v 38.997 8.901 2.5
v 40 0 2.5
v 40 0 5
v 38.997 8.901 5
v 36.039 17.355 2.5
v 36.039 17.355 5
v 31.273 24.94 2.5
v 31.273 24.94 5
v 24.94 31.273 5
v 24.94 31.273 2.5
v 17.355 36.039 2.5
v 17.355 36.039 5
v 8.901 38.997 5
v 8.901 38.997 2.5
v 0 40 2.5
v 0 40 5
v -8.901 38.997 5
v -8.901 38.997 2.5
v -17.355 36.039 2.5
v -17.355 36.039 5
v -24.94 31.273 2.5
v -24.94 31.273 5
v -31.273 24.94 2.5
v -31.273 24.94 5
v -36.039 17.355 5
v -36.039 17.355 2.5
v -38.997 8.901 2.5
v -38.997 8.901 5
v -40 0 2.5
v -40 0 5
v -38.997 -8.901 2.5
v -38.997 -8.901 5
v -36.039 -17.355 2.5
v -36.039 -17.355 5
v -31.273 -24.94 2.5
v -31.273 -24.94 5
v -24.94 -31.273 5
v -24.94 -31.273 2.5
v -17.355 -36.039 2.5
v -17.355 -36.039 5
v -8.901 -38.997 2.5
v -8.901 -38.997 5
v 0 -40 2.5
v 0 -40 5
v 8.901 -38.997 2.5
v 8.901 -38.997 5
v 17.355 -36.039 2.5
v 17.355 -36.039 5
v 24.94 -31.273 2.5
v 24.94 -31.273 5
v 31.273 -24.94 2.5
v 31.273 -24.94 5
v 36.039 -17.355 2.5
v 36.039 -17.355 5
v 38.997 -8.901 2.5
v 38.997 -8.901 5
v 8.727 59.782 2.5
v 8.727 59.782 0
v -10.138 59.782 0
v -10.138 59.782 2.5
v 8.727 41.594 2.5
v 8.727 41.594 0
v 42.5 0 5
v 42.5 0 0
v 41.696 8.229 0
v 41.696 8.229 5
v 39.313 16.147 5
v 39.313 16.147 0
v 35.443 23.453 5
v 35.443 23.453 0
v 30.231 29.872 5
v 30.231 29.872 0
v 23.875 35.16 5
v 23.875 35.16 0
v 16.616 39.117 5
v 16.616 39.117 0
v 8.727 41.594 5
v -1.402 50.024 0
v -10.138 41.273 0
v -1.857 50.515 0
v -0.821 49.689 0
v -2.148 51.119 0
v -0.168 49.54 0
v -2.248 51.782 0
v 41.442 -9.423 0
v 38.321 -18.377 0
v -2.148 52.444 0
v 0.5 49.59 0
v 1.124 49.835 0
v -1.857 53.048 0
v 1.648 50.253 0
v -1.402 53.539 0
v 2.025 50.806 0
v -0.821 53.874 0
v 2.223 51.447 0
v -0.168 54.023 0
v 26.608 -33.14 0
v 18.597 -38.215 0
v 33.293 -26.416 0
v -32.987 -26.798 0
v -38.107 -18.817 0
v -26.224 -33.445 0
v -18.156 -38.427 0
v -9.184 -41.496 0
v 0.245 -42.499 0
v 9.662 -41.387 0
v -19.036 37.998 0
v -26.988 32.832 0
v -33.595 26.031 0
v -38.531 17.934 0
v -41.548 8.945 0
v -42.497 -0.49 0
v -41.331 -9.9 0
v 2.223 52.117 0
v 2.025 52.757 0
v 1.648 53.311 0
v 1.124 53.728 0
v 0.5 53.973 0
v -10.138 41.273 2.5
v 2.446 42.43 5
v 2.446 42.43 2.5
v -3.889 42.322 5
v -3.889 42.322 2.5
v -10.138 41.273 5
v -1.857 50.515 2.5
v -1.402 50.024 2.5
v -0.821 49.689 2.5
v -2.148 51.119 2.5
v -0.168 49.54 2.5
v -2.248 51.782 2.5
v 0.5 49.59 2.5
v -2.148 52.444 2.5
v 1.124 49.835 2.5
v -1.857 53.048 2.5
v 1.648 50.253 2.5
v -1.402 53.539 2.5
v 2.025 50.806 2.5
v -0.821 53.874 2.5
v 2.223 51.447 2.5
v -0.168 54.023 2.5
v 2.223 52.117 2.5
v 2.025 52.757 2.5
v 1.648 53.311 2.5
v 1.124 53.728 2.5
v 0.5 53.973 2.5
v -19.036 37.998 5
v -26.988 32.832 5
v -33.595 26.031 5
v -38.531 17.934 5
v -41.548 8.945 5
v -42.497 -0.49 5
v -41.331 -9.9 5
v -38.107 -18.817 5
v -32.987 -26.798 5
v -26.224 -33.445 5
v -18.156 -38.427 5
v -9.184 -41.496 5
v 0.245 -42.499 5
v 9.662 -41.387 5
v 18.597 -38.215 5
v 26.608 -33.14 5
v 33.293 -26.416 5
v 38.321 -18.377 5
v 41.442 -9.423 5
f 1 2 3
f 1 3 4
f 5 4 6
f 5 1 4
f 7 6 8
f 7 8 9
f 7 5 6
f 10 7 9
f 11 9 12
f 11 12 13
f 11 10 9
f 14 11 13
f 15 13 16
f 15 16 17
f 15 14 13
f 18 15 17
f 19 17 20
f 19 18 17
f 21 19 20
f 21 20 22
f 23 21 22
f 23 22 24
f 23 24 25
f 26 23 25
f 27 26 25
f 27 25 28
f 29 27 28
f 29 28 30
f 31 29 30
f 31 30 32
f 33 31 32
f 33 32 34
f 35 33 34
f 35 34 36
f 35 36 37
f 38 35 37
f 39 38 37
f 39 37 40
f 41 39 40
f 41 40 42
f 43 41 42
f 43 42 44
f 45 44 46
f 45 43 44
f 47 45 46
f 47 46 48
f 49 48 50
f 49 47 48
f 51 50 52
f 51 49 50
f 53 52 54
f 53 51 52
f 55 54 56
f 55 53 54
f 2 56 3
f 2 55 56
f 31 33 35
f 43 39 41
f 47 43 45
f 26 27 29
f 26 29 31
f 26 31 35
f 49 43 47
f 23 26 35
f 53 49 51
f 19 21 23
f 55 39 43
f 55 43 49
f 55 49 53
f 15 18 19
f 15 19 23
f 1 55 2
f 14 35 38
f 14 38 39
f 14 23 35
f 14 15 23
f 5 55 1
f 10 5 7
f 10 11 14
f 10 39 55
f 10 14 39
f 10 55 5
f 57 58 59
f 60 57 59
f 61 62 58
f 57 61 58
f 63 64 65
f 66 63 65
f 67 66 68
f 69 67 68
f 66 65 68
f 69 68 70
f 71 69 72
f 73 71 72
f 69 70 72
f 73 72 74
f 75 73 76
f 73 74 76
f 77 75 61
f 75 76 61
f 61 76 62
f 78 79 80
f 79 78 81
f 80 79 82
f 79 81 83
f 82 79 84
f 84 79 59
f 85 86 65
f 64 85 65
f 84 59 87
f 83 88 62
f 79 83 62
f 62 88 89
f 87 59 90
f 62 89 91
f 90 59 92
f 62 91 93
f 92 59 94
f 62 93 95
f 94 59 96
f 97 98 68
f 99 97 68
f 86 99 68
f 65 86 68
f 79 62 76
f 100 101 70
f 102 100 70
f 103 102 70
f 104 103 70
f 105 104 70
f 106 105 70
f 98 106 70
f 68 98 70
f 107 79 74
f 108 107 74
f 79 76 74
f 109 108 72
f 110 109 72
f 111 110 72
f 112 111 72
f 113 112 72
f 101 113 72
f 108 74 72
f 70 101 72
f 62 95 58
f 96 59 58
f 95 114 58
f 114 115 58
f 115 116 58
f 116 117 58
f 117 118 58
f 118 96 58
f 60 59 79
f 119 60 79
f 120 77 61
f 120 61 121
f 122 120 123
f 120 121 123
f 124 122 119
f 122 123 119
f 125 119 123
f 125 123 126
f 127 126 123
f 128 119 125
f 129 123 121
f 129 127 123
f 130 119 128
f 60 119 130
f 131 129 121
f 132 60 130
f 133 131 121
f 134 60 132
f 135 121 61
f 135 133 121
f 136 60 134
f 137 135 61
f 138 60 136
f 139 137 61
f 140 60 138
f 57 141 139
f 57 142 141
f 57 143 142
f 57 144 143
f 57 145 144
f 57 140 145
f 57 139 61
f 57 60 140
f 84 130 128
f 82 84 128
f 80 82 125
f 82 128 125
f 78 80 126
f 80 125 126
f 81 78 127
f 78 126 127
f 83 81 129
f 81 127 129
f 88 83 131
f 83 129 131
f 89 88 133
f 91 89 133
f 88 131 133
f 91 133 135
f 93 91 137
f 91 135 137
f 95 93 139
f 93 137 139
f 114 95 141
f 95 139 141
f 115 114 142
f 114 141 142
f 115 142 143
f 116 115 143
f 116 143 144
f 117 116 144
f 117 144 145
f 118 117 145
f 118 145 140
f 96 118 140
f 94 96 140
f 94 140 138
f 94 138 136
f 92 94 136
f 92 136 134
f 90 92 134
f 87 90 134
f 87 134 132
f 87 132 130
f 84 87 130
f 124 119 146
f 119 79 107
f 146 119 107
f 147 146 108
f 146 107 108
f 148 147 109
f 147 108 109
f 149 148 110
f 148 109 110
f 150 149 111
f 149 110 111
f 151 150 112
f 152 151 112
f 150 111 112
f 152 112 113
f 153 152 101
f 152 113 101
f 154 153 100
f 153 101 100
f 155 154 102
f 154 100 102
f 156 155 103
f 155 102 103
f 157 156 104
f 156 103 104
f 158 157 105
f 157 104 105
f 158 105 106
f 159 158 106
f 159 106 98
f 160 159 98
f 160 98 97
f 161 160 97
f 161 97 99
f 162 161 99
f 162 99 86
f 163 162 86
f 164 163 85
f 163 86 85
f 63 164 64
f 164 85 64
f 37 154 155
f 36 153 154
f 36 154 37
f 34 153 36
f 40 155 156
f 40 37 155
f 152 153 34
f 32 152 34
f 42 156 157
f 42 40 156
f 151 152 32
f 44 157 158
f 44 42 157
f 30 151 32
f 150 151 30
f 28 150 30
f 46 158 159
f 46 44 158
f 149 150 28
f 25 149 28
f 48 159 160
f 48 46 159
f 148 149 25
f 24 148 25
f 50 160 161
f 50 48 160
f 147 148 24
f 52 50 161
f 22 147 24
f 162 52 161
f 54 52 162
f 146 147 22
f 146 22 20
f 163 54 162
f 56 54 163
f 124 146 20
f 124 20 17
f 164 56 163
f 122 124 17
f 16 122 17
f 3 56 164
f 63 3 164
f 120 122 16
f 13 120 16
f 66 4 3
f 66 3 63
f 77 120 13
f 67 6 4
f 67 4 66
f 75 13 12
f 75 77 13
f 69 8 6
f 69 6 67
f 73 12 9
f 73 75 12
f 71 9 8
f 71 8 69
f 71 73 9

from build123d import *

# Parameters (mm, degrees)
F0_R     = 40
F1_DEPTH = 5
F2_DEPTH = 2.5
F3_D     = 4.4958


with BuildPart() as f1:
    # F0 (on Top) → F1 (new body)
    with BuildSketch(Plane.XY):
        with BuildLine():
            ThreePointArc((-10.1377908892, 41.273177681), (-26.2239765025, -33.4447762198), (42.5, 0))
            ThreePointArc((42.5, 0), (32.9936503742, 26.7893455497), (8.7273395302, 41.5942729799))
            ThreePointArc((8.7273395302, 41.5942729799), (-0.7232695256, 42.4938452154), (-10.1377908892, 41.273177681))
        make_face()
        Circle(F0_R, mode=Mode.SUBTRACT)
    extrude(amount=F1_DEPTH)

    # F0 (on Top) → F2 (join)
    with BuildSketch(Plane.XY):
        with BuildLine():
            ThreePointArc((-10.1377908892, 41.273177681), (-0.7232695256, 42.4938452154), (8.7273395302, 41.5942729799))
            Line((8.7273395302, 41.5942729799), (8.7273395302, 59.7816915568))
            Line((8.7273395302, 59.7816915568), (-10.1377908892, 59.7816915568))
            Line((-10.1377908892, 59.7816915568), (-10.1377908892, 41.273177681))
        make_face()
        Circle(F0_R)
    extrude(amount=F2_DEPTH)

    # F3 (through all)
    with Locations(Plane(origin=(0, 0, 0), x_dir=(1, 0, 0), z_dir=(0, 0, -1))):
        with Locations((0, -51.7816915568)):
            Hole(F3_D / 2)


solid = f1.part
